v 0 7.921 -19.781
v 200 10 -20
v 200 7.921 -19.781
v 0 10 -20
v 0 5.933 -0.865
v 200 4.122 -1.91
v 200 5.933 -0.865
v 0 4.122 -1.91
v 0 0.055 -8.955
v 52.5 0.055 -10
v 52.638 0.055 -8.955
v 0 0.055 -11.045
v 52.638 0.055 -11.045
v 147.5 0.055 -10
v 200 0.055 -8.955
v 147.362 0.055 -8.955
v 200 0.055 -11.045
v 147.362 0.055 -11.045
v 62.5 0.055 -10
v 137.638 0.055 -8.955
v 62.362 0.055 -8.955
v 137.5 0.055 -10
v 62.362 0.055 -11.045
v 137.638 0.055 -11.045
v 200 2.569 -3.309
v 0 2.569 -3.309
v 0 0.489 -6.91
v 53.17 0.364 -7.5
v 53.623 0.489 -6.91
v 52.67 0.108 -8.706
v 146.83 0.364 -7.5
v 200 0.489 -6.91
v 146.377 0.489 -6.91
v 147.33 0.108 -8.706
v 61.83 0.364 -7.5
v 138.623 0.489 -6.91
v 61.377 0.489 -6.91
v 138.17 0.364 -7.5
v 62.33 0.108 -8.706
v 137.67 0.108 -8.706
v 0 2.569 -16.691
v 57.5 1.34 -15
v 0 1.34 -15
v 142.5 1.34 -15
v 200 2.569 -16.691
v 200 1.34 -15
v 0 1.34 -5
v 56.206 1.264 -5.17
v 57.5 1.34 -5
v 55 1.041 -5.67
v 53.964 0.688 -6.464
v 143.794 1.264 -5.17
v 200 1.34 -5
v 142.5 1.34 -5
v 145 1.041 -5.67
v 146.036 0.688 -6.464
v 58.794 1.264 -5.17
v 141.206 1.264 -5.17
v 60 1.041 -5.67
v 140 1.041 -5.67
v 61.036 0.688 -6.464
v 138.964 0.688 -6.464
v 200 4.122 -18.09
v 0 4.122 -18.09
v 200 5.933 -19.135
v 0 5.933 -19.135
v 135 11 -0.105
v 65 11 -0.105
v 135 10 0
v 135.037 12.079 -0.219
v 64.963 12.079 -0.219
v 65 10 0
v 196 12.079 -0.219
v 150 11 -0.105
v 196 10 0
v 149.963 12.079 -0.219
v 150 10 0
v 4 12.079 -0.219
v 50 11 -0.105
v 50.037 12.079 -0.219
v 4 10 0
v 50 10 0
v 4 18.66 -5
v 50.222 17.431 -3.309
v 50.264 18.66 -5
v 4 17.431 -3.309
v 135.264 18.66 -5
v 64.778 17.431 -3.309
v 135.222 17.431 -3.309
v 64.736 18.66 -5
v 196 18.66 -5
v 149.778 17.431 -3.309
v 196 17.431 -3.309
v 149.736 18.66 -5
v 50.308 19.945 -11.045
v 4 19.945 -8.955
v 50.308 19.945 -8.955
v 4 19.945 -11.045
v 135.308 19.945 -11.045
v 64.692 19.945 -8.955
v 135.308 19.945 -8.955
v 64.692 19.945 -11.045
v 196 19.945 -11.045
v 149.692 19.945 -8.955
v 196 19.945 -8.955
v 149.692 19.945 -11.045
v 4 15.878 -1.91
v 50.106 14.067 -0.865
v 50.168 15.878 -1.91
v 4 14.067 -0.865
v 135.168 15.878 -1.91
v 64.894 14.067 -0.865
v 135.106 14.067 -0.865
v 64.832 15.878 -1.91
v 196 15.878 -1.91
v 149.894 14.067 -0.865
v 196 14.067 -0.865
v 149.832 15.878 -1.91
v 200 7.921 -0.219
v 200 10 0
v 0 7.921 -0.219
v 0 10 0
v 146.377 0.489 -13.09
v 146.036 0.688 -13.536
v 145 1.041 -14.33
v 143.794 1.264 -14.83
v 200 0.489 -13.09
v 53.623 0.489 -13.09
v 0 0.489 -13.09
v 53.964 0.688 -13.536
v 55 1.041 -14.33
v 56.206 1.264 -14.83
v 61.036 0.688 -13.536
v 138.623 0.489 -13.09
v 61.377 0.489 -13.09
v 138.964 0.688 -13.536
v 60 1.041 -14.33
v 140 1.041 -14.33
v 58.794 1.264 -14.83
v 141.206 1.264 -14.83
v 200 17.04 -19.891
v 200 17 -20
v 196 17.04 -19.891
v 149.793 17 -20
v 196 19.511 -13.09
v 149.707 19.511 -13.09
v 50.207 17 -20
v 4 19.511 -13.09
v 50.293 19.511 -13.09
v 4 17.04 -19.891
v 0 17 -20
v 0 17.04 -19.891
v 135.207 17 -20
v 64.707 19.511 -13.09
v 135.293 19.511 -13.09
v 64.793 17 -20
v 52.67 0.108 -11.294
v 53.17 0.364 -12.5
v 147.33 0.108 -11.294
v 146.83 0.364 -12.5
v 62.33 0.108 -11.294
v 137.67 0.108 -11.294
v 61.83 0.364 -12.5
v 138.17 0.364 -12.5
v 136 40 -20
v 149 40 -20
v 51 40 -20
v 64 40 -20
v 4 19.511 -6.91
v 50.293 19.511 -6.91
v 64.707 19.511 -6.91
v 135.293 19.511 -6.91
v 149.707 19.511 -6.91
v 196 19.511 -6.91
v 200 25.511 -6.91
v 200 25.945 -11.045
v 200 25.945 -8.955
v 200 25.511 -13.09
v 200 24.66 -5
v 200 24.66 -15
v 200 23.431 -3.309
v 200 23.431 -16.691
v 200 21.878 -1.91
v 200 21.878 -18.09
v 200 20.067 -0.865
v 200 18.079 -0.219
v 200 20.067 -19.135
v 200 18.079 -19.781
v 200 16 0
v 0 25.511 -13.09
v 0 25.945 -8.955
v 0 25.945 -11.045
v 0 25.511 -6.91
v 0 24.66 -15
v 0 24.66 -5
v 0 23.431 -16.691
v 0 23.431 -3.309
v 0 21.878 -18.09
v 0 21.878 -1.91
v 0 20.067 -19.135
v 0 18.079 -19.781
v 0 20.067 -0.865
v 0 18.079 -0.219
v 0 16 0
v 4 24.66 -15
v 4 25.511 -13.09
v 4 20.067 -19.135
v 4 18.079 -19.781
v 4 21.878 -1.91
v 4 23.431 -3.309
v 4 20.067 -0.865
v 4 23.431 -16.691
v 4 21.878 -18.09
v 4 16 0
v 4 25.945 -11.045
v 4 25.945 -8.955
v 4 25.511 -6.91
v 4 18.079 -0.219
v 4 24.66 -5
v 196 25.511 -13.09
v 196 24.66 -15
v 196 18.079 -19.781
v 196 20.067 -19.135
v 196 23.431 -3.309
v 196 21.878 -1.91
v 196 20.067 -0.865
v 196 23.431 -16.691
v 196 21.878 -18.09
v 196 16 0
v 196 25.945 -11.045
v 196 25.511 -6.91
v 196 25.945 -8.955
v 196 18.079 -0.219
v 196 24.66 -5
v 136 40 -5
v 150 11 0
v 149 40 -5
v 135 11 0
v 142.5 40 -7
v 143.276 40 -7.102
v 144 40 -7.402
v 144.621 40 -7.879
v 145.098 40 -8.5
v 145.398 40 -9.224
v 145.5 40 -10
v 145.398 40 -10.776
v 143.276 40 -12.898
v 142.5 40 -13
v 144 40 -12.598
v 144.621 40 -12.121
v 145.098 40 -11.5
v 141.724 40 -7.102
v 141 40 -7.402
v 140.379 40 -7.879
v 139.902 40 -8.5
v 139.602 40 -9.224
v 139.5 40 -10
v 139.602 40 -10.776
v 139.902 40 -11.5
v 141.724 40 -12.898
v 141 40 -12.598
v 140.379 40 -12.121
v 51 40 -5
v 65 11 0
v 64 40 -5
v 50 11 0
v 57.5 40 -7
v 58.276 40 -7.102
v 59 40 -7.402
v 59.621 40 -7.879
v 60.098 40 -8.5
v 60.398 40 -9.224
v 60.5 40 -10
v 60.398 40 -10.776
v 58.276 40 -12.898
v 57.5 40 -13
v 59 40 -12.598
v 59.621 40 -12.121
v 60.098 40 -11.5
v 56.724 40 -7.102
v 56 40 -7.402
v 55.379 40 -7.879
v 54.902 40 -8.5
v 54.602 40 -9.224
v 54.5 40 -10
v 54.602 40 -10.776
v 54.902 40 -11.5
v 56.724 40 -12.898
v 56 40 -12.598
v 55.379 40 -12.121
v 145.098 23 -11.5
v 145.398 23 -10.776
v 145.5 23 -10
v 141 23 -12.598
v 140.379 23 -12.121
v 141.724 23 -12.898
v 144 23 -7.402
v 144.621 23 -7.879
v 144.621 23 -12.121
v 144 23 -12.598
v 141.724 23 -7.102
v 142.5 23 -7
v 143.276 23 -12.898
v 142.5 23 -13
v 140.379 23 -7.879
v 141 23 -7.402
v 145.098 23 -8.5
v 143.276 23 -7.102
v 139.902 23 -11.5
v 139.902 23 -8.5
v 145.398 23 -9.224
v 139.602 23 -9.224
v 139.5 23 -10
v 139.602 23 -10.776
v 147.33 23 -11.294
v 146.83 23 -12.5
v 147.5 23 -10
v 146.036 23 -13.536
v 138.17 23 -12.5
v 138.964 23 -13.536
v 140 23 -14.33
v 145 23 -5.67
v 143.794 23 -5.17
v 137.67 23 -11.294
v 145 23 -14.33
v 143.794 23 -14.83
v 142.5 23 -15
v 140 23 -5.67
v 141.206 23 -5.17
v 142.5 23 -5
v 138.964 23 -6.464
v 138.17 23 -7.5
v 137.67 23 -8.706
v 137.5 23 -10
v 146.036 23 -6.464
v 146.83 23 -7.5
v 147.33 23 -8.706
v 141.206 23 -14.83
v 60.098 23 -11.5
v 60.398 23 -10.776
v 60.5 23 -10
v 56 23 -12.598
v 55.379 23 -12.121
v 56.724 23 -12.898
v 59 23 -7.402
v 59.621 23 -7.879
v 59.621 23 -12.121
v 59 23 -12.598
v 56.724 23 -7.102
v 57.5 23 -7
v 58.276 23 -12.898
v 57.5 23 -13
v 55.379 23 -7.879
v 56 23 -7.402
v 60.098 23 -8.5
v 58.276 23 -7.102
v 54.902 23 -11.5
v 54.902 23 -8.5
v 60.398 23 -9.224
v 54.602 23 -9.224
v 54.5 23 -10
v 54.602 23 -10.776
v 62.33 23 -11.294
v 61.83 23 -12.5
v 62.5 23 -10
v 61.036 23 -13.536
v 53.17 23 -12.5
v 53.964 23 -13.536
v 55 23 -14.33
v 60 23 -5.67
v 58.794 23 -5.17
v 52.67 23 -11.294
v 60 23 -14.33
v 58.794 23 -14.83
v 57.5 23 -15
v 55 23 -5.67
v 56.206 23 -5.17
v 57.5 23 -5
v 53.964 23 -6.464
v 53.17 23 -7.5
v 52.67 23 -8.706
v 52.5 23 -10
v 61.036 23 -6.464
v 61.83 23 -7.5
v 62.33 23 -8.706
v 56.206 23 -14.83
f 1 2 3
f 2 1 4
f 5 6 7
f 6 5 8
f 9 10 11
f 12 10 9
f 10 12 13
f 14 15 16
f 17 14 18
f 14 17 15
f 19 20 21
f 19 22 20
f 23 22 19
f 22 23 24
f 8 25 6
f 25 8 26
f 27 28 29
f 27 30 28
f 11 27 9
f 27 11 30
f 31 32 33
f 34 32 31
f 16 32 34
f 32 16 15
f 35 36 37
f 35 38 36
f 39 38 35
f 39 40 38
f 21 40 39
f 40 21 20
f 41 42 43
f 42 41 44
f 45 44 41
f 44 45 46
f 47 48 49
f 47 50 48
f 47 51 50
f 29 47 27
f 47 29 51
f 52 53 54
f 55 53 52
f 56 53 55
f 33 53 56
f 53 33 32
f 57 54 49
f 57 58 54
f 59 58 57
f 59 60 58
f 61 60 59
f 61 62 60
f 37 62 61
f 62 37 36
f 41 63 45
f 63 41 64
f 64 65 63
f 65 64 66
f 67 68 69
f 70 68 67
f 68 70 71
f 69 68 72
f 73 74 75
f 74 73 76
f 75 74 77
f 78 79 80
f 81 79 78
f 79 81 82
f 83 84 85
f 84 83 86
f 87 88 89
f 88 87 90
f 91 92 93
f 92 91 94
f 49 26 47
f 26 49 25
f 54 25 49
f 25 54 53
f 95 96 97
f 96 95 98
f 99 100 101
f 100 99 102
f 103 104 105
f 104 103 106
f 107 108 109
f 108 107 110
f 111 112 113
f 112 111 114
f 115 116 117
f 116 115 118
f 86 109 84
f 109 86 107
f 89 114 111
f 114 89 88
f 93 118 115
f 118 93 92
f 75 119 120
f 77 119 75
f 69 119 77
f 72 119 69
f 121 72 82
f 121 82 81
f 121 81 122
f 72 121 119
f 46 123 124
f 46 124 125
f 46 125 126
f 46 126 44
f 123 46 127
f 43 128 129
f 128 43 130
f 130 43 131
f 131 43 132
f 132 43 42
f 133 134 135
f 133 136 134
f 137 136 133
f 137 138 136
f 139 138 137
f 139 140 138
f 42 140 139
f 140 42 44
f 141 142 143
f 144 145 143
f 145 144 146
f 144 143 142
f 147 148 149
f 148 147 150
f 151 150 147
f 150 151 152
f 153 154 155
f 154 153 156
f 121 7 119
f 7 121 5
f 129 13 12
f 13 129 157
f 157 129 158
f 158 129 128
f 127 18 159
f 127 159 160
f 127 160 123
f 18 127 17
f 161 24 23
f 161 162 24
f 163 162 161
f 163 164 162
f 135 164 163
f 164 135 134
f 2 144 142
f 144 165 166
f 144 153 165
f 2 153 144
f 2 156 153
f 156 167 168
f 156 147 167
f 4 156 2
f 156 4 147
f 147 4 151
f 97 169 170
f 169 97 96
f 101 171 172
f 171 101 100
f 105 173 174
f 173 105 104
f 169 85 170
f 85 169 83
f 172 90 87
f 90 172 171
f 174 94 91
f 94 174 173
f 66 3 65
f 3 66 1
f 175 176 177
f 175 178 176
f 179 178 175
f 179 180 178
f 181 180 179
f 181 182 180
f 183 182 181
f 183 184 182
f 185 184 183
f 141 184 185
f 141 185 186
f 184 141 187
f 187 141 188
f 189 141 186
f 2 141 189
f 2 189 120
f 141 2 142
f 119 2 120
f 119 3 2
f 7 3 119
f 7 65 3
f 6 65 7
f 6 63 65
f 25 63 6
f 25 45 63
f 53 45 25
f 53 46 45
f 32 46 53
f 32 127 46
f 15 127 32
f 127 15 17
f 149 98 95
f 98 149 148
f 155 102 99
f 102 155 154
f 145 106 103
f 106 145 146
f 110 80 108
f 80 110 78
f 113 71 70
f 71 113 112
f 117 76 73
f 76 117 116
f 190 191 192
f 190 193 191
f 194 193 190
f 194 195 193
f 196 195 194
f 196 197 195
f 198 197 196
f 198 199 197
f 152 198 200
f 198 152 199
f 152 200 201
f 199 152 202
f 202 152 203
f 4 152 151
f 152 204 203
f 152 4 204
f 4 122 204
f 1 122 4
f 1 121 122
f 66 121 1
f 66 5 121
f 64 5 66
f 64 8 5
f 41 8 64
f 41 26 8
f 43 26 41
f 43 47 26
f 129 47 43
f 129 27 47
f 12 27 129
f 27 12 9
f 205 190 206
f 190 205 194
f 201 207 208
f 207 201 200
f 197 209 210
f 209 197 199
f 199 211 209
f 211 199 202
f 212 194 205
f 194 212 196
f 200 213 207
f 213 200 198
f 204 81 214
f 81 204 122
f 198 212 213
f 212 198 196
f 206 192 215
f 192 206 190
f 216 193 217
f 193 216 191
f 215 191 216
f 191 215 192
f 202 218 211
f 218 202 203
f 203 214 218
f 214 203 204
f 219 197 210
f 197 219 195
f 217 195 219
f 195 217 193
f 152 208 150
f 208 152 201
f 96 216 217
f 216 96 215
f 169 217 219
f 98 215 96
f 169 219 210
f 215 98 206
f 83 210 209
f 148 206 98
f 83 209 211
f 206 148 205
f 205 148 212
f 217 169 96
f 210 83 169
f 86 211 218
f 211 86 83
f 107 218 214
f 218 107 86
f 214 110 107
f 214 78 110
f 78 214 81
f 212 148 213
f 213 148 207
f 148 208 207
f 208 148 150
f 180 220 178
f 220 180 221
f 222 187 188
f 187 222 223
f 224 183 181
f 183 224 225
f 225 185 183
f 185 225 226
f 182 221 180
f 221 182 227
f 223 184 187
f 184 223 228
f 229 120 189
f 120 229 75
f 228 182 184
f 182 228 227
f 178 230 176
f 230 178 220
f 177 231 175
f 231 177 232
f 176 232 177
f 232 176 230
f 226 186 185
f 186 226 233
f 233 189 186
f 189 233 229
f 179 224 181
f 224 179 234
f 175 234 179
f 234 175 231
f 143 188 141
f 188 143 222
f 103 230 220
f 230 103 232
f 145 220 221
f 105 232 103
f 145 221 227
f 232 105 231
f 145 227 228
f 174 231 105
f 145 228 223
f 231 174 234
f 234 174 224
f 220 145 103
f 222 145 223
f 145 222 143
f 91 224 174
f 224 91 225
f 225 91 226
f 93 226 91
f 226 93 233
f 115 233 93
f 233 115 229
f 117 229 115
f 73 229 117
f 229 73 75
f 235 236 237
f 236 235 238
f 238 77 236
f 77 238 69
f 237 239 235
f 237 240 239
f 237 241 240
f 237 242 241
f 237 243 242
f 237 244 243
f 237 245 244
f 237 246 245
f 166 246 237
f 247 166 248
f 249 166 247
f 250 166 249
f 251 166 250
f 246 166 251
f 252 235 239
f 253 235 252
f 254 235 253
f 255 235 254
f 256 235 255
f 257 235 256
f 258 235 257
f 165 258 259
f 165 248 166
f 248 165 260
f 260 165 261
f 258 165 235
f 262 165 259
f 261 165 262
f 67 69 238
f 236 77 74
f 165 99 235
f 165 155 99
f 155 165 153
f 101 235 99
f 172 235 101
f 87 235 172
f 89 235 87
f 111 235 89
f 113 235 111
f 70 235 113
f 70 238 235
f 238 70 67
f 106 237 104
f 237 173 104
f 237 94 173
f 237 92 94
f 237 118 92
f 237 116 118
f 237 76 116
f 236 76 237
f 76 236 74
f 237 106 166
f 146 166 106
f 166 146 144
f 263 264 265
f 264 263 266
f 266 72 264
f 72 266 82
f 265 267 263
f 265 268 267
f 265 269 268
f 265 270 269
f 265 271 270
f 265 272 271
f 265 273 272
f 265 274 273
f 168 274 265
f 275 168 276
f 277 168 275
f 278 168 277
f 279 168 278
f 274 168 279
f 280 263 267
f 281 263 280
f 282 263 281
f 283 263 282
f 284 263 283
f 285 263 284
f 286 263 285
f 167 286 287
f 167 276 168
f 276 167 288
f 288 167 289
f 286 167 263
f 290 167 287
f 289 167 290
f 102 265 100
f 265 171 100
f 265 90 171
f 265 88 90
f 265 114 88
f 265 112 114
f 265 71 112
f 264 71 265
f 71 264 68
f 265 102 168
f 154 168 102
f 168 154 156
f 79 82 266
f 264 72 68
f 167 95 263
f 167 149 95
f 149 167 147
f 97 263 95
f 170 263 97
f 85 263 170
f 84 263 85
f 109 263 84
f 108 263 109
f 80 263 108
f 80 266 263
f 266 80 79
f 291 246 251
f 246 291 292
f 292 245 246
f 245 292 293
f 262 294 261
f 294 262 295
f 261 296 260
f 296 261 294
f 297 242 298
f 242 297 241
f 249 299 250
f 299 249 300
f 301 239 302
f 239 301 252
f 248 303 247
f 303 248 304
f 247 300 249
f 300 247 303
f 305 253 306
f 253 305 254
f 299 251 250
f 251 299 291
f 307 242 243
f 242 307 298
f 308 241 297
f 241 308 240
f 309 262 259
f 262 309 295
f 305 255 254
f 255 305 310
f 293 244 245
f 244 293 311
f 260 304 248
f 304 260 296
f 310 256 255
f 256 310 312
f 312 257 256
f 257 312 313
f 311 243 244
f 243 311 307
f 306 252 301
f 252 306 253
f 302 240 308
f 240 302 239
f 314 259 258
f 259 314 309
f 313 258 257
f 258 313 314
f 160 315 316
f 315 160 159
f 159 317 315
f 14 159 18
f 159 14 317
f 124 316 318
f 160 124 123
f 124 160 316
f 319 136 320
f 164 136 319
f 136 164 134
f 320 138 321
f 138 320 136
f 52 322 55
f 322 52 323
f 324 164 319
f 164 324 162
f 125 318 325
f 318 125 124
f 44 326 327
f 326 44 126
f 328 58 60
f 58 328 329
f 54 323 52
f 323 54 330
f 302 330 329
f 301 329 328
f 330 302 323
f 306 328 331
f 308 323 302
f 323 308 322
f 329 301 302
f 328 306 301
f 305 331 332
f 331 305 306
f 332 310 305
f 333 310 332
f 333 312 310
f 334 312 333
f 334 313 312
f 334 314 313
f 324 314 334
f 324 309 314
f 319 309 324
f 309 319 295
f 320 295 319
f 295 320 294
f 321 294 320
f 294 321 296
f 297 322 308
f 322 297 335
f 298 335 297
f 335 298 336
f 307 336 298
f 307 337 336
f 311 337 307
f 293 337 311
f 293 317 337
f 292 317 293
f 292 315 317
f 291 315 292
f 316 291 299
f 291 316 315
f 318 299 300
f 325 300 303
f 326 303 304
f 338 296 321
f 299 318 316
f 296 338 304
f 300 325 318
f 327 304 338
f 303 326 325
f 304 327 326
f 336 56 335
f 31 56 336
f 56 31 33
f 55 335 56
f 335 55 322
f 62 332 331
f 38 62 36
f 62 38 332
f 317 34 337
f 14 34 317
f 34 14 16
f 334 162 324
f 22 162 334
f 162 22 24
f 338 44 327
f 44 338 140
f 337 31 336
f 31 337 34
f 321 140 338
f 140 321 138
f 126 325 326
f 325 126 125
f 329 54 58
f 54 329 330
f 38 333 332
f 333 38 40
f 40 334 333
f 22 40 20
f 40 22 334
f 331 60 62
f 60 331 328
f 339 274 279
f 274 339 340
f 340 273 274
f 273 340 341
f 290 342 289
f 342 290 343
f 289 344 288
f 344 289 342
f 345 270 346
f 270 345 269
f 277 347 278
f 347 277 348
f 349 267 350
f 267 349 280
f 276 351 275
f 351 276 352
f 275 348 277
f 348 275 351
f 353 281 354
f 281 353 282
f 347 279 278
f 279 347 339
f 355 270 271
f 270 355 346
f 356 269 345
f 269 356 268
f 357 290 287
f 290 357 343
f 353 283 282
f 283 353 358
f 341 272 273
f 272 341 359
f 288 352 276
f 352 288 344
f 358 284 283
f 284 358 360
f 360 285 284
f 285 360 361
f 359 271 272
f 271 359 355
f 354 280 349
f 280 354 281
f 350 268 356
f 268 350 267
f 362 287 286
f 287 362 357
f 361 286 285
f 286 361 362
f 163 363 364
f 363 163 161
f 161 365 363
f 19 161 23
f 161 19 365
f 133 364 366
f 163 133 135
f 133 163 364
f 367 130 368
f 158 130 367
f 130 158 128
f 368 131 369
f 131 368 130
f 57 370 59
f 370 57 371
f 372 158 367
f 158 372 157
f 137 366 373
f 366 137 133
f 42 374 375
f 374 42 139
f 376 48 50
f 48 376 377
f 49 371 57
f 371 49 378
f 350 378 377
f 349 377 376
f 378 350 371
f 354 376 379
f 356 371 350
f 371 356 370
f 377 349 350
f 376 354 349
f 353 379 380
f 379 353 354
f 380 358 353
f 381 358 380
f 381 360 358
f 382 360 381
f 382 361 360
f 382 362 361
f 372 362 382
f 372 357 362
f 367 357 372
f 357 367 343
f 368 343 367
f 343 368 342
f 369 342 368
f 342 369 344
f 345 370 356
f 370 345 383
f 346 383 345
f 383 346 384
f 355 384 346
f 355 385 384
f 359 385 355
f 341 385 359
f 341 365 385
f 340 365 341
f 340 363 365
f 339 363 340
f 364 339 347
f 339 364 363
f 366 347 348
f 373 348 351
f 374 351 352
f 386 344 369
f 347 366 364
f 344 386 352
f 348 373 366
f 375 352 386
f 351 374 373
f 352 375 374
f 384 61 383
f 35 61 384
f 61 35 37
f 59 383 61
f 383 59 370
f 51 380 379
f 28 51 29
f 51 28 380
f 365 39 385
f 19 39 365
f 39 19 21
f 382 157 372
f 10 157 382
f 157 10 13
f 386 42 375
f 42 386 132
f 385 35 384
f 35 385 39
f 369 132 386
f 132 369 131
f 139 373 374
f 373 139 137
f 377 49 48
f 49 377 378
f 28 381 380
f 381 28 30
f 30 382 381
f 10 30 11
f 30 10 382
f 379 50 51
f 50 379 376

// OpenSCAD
stud_d=4;
stud_h=85;
stud_w=25;
base_d=10+stud_d;
base_h=20;
stud_distance=90;

base_w = 200;

extension_d=30;
extension_h=base_h;
extension_w=15;
hole_distance=85;
hole_dia=6;
head_dia=10;
//head_d=6;

screw_length=21;

module stud() {
 hull() { 
  cube([stud_w, stud_d, stud_h]);
  translate([0.5*stud_w, 0.5*stud_d, stud_h+0.5*stud_w]) sphere(d=stud_d);
 }
  //translate([0.5*stud_w, 0, stud_h]) rotate([-90, 0, 0]) cylinder(h=stud_d, d=stud_w);

}

module extension() {
  //cube([extension_w, extension_d, extension_h]);
      hull() {
    cube([extension_w, 1, extension_h]);
    translate([1, extension_d-base_d, 0]) cube([extension_w-2, base_d, extension_w]);
  }

}

module screw_hole() {
  $fn=24;
  hole_needed=base_d+extension_d;
  head_d = hole_needed - screw_length;
    translate([0.5*base_w, 0, -0.5*base_h])
    rotate([-90, 0, 0]) {
        cylinder(h=base_d+extension_d, d=hole_dia);
        cylinder(h=head_d, d=head_dia);
    }
}

module base() {
  //cube([base_w, base_d, base_h]);
  hull() {
  translate([0, 0.5*base_h, 0.5*base_h]) rotate([0, 90, 0]) cylinder(d=base_h, h=base_w);
  translate([0, 0.5*base_h, 0]) cube([base_w, 0.5*base_d, 0.5*base_d]);
  }
  //translate([0, 0.5*base_h, 0.5*base_h]) 
 
  hull() {
  translate([0, 0.8*base_h, 0.5*base_h]) rotate([0, 90, 0]) 
    cylinder(d=base_h, h=stud_d);
  translate([0, 0.5*base_h, 0.5*base_h]) rotate([0, 90, 0]) 
    cylinder(d=base_h, h=stud_d);
   }
  hull() {
  translate([base_w-stud_d, 0.8*base_h, 0.5*base_h]) rotate([0, 90, 0]) 
    cylinder(d=base_h, h=stud_d);
   translate([base_w-stud_d, 0.5*base_h, 0.5*base_h]) rotate([0, 90, 0]) 
    cylinder(d=base_h, h=stud_d);
  }
 
  translate([0.5*(base_w-extension_w+hole_distance), 0.5*base_h, 0]) extension();
  translate([0.5*(base_w-extension_w-hole_distance), 0.5*base_h, 0]) extension();
}

difference() {
  translate([0, 0, -base_h]) base();
  translate([0.5*hole_distance, 0, 0]) screw_hole();
  translate([-0.5*hole_distance, 0, 0]) screw_hole();
}
//stud();
//translate([stud_distance, 0, 0]) stud();
